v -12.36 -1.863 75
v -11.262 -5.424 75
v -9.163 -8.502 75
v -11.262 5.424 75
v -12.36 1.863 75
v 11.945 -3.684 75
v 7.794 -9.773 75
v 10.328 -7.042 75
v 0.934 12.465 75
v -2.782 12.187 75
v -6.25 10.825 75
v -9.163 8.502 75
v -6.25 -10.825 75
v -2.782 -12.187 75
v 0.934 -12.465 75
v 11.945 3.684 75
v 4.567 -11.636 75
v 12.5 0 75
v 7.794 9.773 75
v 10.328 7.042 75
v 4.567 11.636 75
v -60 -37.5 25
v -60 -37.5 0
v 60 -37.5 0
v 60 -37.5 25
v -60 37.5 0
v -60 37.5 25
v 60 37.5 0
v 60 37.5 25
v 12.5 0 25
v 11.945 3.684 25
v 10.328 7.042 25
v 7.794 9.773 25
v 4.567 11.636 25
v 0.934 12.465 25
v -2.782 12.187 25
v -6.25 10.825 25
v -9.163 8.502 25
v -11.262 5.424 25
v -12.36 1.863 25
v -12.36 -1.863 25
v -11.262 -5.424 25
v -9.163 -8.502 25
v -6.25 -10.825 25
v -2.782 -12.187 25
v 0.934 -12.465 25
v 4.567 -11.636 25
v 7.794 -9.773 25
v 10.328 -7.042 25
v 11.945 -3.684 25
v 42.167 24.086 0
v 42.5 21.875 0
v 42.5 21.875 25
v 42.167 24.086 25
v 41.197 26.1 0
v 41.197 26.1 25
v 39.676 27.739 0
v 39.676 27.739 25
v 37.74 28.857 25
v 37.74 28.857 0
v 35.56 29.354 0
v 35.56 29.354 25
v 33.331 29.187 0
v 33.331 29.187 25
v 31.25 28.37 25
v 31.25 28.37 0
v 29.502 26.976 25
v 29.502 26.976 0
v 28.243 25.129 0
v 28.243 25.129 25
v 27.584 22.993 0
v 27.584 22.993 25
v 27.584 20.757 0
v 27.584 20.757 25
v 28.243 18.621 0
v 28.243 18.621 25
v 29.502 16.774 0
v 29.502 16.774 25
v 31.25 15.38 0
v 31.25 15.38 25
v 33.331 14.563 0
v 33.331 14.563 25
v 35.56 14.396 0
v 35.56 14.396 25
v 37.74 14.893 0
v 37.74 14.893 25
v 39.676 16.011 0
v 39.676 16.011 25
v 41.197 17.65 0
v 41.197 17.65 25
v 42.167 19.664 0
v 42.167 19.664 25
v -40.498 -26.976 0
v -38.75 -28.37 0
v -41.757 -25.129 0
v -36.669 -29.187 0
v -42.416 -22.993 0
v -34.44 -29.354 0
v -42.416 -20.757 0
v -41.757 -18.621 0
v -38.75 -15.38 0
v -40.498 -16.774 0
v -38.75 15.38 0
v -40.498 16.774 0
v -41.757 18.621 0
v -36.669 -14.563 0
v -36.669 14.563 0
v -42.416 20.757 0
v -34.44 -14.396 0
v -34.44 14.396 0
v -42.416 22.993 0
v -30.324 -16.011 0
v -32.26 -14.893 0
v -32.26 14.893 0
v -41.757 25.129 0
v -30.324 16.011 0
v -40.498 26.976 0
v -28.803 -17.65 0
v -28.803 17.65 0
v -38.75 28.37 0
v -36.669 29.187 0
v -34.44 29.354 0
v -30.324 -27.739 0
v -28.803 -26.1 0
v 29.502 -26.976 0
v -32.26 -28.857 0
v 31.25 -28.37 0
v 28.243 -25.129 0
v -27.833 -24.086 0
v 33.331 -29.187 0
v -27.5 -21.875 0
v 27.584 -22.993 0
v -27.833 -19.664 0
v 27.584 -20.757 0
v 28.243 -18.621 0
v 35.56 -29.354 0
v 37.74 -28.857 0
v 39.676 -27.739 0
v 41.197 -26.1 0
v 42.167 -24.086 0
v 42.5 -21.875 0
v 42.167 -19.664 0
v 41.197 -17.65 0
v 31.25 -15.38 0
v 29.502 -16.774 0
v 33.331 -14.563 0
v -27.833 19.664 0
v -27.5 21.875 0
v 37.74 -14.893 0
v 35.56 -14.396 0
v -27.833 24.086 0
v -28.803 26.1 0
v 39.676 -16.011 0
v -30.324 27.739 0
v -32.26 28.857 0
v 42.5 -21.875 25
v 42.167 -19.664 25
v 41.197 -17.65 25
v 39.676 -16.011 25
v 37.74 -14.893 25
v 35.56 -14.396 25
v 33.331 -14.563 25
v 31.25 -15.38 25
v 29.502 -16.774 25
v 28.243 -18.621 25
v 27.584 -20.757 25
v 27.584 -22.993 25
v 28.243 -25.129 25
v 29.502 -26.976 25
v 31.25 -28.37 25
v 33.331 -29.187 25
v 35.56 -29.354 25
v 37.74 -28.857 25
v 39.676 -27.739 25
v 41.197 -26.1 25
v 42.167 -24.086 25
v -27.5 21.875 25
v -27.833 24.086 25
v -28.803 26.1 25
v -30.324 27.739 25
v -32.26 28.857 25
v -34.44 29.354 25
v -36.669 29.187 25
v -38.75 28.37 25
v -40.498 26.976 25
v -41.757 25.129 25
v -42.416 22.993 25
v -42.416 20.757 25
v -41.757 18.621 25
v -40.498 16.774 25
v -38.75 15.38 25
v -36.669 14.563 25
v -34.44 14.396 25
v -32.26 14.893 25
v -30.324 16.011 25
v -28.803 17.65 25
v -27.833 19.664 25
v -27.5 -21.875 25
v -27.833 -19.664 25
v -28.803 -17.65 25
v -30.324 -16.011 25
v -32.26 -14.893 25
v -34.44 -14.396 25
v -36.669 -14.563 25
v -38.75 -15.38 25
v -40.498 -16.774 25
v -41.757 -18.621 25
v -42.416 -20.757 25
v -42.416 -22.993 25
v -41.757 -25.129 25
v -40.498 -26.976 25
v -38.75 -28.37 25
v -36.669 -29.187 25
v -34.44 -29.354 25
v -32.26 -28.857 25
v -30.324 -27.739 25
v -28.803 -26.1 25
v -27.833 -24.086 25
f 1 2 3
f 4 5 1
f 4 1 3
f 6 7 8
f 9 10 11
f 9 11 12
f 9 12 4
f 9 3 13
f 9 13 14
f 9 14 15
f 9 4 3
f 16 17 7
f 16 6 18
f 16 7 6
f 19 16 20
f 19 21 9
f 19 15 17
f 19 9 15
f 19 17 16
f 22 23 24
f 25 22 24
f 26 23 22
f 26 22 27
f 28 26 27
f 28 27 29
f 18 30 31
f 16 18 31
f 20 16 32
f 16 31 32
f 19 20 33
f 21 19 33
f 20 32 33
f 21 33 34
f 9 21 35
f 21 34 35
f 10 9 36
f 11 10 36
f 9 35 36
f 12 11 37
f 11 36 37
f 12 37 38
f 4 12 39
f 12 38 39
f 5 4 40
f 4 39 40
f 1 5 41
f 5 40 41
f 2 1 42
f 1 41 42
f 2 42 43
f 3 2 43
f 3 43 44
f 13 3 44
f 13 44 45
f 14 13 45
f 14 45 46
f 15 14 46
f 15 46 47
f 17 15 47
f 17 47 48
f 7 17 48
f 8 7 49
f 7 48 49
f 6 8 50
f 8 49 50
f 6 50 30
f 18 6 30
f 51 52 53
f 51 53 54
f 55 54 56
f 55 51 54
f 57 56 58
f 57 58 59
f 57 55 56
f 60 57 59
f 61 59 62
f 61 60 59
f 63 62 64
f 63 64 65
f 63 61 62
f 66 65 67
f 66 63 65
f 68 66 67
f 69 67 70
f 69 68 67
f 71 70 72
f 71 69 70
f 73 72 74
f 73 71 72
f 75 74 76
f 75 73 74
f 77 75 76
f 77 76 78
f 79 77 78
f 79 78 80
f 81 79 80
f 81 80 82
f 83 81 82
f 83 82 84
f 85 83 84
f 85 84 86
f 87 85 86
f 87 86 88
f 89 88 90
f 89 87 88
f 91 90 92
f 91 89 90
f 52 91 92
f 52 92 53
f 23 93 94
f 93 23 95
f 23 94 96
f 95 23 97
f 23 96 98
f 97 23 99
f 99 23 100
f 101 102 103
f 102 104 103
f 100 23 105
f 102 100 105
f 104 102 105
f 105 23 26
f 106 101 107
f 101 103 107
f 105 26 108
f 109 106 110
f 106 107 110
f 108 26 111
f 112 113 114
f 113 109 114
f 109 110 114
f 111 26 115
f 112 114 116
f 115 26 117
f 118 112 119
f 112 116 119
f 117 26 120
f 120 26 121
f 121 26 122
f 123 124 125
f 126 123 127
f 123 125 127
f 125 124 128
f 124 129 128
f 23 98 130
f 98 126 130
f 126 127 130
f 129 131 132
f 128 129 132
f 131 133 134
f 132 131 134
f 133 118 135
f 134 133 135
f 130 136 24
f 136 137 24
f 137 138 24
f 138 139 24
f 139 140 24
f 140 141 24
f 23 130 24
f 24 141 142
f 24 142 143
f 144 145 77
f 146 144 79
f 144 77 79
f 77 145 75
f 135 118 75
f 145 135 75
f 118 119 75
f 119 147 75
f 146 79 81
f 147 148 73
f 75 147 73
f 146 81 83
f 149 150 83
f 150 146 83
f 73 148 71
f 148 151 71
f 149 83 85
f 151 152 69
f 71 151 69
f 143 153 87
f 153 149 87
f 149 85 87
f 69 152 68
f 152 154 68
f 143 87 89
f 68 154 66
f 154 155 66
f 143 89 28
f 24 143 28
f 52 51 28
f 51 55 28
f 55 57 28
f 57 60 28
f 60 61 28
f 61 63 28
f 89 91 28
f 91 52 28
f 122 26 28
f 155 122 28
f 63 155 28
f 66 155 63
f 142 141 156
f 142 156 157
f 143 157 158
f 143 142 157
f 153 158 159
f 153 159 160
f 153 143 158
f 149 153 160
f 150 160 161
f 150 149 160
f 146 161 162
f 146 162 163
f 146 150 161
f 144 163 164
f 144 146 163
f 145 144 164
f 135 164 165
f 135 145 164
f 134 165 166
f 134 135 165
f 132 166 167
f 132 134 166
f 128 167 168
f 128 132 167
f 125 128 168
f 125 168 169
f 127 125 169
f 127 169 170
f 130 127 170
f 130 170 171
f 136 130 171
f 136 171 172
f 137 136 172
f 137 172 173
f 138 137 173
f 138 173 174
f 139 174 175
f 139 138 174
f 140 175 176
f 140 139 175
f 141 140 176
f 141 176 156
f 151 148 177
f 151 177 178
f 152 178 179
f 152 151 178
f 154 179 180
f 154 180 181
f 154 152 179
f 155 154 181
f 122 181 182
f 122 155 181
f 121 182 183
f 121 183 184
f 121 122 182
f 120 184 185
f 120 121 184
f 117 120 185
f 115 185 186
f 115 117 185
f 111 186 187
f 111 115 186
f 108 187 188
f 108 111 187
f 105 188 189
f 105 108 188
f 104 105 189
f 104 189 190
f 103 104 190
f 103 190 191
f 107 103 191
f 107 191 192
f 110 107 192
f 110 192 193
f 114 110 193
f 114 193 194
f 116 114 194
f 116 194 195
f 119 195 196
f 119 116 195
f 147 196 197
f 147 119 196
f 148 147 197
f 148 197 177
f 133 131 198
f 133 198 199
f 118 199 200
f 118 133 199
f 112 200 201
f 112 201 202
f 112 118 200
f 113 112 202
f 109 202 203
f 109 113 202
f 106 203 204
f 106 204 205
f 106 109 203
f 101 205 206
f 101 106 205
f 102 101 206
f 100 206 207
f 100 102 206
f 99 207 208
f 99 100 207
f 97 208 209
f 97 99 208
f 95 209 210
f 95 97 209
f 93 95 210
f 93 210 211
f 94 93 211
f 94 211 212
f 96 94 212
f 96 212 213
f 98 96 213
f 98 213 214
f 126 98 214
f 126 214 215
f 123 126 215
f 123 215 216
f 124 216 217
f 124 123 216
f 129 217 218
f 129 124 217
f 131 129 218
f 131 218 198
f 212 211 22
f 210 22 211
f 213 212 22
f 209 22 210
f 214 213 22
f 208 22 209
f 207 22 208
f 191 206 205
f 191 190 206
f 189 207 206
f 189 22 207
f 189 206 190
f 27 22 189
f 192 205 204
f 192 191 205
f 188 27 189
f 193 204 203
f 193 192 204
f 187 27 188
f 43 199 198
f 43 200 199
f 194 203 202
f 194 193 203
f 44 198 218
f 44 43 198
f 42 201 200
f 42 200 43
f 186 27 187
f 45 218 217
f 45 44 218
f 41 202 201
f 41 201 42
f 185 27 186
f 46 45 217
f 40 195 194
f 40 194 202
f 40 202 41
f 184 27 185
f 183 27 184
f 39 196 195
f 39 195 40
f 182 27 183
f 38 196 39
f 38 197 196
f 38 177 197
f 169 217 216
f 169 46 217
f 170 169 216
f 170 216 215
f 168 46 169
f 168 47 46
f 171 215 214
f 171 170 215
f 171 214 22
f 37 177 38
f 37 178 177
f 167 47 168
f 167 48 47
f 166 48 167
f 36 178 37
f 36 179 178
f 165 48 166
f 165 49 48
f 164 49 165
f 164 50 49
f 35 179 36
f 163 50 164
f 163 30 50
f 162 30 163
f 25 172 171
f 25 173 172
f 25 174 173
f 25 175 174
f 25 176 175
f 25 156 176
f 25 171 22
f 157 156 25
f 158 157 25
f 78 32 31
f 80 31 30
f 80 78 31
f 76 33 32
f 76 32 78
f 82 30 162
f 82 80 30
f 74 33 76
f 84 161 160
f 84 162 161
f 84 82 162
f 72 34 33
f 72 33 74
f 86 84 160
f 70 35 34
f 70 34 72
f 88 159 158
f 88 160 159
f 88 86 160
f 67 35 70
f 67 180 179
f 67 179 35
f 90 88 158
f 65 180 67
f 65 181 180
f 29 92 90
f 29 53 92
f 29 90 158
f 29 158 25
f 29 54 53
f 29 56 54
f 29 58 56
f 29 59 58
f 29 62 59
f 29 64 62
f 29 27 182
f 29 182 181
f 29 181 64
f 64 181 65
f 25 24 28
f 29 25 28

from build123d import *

# Parameters (mm, degrees)
SKETCH1_W           = 120
SKETCH1_H           = 75
SKETCH1_R           = 7.5
BOSS_EXTRUDE1_DEPTH = 25
SKETCH2_R           = 12.5
BOSS_EXTRUDE2_DEPTH = 50


with BuildPart() as part:
    # Sketch1 → Boss-Extrude1 (new body)
    with BuildSketch(Plane.XY):
        Rectangle(SKETCH1_W, SKETCH1_H)
        with Locations((35, 21.875)):
            Circle(SKETCH1_R, mode=Mode.SUBTRACT)
        with Locations((-35, 21.875)):
            Circle(SKETCH1_R, mode=Mode.SUBTRACT)
        with Locations((-35, -21.875)):
            Circle(SKETCH1_R, mode=Mode.SUBTRACT)
        with Locations((35, -21.875)):
            Circle(SKETCH1_R, mode=Mode.SUBTRACT)
    extrude(amount=BOSS_EXTRUDE1_DEPTH)

    # Sketch2 → Boss-Extrude2 (add)
    with BuildSketch(Plane.XY.offset(25)):
        Circle(SKETCH2_R)
    extrude(amount=BOSS_EXTRUDE2_DEPTH)


solid = part.part
